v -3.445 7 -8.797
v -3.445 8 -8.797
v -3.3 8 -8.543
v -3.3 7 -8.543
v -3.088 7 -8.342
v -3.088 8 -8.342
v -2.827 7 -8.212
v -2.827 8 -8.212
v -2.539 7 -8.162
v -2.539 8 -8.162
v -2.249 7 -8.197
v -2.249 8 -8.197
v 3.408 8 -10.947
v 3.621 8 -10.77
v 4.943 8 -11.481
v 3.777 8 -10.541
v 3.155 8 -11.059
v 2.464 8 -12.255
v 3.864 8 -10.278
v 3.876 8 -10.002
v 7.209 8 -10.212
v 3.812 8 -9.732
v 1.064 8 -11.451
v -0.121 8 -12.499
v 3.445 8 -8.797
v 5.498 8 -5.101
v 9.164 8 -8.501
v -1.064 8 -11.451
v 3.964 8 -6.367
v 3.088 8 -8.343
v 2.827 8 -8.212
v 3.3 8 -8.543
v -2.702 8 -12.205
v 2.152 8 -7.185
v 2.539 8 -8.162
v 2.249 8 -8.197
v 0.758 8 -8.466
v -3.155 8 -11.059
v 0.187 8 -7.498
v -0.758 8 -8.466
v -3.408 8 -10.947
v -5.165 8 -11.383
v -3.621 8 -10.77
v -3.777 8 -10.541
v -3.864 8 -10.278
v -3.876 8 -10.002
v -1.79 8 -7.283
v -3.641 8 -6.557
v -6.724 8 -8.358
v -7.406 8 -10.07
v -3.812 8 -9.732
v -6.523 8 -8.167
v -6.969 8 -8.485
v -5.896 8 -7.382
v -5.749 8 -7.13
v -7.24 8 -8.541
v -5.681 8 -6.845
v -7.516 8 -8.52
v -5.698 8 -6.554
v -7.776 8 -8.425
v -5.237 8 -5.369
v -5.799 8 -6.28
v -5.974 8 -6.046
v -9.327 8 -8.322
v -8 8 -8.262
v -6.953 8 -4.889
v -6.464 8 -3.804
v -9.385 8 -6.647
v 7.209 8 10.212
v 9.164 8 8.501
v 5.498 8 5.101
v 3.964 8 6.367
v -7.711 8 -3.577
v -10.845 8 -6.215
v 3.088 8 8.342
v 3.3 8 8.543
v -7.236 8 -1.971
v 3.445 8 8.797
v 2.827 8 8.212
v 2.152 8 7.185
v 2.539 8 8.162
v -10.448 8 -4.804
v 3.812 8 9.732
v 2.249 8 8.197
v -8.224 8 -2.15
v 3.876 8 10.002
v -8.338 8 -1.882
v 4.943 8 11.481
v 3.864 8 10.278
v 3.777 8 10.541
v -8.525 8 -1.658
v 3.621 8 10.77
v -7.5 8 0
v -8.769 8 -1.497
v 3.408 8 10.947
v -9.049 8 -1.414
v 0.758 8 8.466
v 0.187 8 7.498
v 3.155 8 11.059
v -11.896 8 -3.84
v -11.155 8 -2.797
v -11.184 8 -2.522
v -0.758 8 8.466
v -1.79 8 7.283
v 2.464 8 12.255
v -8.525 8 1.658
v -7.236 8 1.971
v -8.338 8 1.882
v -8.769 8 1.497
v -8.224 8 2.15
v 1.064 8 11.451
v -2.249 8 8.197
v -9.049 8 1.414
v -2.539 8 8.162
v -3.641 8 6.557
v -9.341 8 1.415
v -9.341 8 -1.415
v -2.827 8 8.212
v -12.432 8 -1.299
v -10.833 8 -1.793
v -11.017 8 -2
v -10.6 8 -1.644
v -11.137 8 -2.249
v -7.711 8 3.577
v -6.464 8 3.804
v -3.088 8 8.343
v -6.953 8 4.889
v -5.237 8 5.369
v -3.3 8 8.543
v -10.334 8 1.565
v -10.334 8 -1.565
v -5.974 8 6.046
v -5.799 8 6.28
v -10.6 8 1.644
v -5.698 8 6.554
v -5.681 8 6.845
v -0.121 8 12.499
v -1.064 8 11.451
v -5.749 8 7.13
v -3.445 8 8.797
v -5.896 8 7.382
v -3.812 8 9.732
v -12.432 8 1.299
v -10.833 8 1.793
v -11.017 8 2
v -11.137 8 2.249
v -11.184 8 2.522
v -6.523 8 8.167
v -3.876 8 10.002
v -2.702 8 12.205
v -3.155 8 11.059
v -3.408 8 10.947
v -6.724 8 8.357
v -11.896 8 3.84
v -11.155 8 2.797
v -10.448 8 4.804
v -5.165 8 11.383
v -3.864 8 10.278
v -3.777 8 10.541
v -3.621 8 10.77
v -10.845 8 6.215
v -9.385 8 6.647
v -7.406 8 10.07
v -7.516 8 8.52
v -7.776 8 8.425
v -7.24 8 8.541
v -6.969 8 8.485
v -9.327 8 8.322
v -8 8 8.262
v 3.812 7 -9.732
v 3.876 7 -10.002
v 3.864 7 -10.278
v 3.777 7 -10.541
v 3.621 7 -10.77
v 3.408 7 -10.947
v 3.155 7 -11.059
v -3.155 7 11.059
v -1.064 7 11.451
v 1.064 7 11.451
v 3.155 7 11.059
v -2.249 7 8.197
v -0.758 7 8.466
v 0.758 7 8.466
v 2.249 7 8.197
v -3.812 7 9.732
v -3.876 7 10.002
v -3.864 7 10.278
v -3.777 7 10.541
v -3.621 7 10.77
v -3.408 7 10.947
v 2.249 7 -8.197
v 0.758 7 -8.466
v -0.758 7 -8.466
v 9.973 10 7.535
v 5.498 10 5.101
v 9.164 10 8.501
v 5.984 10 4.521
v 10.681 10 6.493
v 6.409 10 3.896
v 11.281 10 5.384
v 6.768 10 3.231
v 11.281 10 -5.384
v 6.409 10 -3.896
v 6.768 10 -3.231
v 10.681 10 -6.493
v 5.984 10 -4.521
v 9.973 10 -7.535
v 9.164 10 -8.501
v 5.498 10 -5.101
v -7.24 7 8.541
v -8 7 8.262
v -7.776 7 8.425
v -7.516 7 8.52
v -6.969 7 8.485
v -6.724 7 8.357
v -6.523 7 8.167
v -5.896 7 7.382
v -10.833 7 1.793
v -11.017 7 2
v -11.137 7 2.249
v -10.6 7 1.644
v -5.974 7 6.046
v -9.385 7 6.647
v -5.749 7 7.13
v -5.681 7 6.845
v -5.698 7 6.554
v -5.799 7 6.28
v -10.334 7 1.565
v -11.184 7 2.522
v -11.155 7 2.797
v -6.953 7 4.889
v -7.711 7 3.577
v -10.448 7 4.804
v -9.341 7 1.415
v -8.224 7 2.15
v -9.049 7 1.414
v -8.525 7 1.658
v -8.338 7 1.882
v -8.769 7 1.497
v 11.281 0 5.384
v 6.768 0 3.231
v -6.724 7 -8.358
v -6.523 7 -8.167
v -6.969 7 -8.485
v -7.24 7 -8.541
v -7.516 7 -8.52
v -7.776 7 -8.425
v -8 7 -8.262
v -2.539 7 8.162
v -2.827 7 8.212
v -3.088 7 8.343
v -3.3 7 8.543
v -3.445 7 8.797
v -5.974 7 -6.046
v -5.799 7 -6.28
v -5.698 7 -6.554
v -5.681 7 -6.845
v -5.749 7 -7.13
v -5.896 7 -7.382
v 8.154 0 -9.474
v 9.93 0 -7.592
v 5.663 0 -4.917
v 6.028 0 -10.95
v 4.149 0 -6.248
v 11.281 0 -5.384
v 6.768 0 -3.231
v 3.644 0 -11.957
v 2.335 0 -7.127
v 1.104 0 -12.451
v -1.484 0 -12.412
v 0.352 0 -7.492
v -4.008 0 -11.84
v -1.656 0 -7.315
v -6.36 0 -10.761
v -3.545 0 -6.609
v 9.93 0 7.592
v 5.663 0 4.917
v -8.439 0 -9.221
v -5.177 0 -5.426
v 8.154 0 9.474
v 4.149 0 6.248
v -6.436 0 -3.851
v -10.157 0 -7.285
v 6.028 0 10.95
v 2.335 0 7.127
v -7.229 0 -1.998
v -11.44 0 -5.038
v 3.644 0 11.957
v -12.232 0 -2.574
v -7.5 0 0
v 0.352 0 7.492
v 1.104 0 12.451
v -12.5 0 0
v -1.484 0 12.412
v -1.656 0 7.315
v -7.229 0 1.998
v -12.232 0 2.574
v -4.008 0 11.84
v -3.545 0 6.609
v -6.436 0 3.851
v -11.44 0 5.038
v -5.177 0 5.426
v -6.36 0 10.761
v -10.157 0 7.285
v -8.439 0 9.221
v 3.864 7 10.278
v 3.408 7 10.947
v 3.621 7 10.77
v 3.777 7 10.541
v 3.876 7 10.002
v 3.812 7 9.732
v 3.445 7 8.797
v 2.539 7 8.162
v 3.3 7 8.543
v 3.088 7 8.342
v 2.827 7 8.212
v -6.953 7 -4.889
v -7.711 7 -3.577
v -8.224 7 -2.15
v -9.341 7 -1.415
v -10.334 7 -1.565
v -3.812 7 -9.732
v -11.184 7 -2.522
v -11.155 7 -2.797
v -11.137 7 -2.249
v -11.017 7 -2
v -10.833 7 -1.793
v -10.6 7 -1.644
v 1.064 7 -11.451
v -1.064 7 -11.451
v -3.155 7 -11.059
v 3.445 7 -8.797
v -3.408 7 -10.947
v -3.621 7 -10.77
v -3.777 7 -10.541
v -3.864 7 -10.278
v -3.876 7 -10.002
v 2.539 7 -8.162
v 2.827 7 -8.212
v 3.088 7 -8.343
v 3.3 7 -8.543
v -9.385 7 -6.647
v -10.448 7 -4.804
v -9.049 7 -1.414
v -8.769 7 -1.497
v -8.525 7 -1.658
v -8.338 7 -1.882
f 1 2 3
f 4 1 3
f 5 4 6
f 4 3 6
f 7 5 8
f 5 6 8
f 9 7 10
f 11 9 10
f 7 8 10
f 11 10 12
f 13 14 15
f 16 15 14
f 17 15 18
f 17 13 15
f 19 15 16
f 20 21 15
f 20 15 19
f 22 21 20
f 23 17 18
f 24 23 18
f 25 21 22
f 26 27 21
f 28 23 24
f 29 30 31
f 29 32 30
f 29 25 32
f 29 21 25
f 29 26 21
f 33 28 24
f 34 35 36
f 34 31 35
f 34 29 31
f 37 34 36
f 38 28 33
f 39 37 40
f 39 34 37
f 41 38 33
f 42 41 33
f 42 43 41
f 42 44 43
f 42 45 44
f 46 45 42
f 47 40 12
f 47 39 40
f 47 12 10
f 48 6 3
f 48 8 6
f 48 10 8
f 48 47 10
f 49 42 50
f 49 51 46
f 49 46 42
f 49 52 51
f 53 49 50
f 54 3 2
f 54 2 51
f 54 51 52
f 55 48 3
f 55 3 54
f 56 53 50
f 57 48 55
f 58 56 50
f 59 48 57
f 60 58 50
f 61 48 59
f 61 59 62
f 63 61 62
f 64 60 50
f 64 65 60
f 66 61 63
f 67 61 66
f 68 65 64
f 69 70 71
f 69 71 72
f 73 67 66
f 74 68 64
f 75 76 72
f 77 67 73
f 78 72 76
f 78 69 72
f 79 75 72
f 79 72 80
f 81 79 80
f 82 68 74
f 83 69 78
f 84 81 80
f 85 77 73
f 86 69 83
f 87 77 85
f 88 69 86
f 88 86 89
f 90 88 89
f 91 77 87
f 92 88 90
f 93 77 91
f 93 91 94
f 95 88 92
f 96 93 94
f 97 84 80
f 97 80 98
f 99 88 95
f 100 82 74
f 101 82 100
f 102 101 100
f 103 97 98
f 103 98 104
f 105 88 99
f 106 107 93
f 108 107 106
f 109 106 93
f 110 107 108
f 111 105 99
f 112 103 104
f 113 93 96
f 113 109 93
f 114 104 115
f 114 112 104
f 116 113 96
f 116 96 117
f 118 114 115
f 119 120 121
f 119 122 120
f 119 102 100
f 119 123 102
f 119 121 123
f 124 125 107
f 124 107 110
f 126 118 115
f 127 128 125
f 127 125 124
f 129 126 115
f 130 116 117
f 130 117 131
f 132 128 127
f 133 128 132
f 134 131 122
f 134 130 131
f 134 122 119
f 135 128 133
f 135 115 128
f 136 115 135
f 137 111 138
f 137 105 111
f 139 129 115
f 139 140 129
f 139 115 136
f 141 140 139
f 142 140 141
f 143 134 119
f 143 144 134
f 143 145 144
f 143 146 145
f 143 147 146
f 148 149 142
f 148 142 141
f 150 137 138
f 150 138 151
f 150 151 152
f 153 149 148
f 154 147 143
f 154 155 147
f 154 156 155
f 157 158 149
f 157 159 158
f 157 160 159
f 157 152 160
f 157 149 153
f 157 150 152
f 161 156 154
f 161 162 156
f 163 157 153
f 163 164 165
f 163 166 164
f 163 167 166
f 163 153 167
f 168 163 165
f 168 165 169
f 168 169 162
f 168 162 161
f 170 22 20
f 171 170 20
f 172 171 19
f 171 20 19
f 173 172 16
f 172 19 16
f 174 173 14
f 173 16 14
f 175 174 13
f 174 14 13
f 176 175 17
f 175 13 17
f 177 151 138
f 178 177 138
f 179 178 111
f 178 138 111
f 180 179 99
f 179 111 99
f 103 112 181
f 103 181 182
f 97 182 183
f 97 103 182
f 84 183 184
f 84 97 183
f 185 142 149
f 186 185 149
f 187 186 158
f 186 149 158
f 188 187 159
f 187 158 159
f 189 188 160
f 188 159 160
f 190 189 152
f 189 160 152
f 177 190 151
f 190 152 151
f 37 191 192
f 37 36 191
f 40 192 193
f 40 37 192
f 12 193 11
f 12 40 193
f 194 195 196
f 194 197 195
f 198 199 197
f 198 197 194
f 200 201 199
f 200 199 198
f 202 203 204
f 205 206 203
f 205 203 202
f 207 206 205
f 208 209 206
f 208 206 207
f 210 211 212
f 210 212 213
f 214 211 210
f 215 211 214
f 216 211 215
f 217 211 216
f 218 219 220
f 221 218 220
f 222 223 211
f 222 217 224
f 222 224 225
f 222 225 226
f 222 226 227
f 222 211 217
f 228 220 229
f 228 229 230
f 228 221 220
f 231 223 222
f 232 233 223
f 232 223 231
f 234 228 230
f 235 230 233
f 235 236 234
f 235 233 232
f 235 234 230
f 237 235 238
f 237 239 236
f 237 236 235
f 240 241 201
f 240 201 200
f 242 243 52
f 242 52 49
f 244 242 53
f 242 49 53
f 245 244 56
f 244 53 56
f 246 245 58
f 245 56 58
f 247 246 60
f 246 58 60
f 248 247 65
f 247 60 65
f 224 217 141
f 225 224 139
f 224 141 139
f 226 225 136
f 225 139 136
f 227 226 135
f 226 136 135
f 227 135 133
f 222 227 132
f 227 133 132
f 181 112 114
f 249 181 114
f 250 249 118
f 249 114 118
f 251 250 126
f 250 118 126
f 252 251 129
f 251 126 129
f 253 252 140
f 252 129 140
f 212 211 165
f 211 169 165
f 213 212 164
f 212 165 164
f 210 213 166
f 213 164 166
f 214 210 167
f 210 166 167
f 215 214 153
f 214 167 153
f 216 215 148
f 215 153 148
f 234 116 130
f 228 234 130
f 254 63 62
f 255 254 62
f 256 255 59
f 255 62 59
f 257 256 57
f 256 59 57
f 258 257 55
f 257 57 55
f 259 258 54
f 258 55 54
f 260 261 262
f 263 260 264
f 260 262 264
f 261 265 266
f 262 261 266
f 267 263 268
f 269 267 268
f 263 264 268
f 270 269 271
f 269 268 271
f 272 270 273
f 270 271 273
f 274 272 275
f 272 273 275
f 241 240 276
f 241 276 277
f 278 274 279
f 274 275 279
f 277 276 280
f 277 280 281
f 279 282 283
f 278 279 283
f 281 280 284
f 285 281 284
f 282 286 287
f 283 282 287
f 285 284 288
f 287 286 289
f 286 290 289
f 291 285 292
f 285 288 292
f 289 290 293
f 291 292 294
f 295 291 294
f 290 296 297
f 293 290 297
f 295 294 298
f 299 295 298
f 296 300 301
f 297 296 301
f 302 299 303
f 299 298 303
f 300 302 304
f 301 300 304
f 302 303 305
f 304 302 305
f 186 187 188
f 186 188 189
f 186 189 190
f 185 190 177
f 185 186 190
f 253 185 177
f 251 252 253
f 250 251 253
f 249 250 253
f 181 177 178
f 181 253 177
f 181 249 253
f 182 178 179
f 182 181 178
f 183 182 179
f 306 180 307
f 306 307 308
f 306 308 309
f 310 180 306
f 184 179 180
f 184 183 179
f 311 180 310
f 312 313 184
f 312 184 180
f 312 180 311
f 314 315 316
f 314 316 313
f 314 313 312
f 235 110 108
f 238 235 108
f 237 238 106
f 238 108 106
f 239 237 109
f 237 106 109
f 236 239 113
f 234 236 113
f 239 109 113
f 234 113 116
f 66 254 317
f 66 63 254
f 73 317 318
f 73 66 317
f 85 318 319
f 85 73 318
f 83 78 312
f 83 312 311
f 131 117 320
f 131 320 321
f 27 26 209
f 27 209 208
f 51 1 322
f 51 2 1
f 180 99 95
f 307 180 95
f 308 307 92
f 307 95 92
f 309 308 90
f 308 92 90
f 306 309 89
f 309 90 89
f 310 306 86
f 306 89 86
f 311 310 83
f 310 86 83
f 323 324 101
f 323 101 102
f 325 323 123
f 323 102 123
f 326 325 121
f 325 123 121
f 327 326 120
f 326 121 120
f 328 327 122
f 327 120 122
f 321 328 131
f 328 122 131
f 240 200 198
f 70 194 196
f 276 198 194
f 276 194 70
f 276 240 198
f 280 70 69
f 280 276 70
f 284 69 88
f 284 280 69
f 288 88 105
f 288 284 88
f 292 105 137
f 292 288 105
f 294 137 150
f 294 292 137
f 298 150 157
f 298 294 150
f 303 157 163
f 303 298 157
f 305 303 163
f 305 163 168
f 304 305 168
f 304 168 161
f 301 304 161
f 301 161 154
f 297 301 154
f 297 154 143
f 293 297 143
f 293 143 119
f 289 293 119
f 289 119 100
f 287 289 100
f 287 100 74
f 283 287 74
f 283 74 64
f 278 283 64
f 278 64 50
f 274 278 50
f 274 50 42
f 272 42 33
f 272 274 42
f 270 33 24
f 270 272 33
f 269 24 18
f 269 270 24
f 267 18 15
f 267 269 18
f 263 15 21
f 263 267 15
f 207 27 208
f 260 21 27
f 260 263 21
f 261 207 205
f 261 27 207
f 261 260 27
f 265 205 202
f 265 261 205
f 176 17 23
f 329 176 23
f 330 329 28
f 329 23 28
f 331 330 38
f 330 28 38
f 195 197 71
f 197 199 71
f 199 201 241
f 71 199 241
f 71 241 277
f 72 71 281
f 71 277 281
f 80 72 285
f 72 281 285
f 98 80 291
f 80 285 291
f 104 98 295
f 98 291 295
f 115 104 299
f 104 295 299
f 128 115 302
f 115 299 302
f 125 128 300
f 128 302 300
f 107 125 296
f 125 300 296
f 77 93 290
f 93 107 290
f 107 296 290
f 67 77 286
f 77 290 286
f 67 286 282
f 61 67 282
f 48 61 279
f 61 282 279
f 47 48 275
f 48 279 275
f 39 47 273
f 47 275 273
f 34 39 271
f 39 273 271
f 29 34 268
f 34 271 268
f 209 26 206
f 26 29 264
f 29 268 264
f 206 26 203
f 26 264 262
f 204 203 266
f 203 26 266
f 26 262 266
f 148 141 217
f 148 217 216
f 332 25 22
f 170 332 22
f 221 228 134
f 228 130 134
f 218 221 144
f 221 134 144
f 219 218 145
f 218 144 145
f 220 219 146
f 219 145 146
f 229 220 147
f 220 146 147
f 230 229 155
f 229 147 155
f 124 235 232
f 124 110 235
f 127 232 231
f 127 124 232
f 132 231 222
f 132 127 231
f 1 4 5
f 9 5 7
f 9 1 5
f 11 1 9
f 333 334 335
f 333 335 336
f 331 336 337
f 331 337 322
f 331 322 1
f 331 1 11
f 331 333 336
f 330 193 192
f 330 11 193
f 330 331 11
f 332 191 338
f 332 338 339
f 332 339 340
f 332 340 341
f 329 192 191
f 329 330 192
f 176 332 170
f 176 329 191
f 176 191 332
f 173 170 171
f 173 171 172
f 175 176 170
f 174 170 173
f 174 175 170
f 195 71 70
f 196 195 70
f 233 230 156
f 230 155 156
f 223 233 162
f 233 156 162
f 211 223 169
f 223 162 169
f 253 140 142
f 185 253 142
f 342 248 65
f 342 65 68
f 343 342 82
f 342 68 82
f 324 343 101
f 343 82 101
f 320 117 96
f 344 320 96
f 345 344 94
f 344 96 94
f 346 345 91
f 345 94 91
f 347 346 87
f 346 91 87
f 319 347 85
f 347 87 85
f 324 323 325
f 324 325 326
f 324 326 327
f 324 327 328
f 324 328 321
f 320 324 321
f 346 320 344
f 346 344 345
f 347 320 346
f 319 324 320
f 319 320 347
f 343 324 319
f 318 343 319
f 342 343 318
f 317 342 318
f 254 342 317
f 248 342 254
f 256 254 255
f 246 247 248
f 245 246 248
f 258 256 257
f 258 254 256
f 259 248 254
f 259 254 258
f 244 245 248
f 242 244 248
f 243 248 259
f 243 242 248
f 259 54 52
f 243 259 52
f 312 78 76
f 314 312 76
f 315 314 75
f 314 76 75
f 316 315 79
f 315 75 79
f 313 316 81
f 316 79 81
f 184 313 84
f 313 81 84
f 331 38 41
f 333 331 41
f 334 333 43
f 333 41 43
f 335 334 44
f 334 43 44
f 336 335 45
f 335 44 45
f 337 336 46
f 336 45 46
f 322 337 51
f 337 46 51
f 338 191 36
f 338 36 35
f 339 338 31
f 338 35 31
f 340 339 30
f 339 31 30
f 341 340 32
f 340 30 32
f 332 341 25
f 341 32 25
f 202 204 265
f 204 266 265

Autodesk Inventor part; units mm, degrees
ref_plane "YZ Plane" through (0, 0, 0) normal (1, 0, 0) x (0, 1, 0)
ref_plane "XZ Plane" through (0, 0, 0) normal (0, 1, 0) x (-1, 0, 0)
ref_plane "XY Plane" through (0, 0, 0) normal (0, 0, 1) x (1, 0, 0)
sketch "Эскиз1" plane through (0, 0, 0) normal (0, 1, 0) x (-1, 0, 0)
  arc A0 (-11.2808, -5.3845) -> (-11.2808, 5.3845) centre (0, 0) ccw
  arc A1 (-6.7685, -3.2307) -> (-6.7685, 3.2307) centre (0, 0) ccw
  line L0 (-6.7685, -3.2307) -> (-11.2808, -5.3845)
  line L1 (-6.7685, 3.2307) -> (-11.2808, 5.3845)
  dimension "d0" = 25
  dimension "d1" = 15
extrude "Выдавливание1" add sketch "Эскиз1" along normal blind 8
sketch "Эскиз2" plane through (0, 8, 0) normal (0, 1, 0) x (1, 0, 0)
  line L0 (5.4983, 5.1008) -> (9.1638, 8.5014)
  arc A0 (11.2808, 5.3845) -> (11.2808, -5.3845) centre (0, 0) ccw projected
  arc A1 (11.2808, 5.3845) -> (11.2808, -5.3845) centre (0, 0) ccw projected
  line L1 (11.2808, -5.3845) -> (6.7685, -3.2307) projected
  arc A2 (6.7685, 3.2307) -> (6.7685, -3.2307) centre (0, 0) ccw projected
  line L2 (6.7685, 3.2307) -> (11.2808, 5.3845) projected
  arc A3 (6.7685, 3.2307) -> (6.7685, -3.2307) centre (0, 0) ccw projected
  line L3 (5.4983, -5.1008) -> (9.1638, -8.5014)
  point P0 (11.2808, -5.3845)
extrude "Выдавливание2" add sketch "Эскиз2" along normal blind 2 contours L0 A0 L2 A2 | A2 L1 A0 L3
sketch "Эскиз3" plane through (0, 8, 0) normal (0, 1, 0) x (1, 0, 0)
  arc A0 (2.2493, 8.197) -> (-2.2493, 8.197) centre (0, 0) ccw
  arc A1 (3.1548, 11.0588) -> (-3.1548, 11.0588) centre (0, 0) ccw
  line L0 (3.4451, 8.7967) -> (3.8116, 9.7325)
  arc A2 (9.1638, 8.5014) -> (9.1638, -8.5014) centre (0, 0) ccw projected
  arc A3 (5.4983, 5.1008) -> (5.4983, -5.1008) centre (0, 0) ccw projected
  line L1 (-3.4451, 8.7967) -> (-3.8116, 9.7325)
  arc A4 (3.8116, 9.7325) -> (3.1548, 11.0588) centre (2.8804, 10.0972) ccw
  arc A5 (2.2493, 8.197) -> (3.4451, 8.7967) centre (2.5139, 9.1613) ccw
  arc A6 (-3.1548, 11.0588) -> (-3.8116, 9.7325) centre (-2.8804, 10.0972) ccw
  arc A7 (-3.4451, 8.7967) -> (-2.2493, 8.197) centre (-2.5139, 9.1613) ccw
  arc A8 (-5.9741, 6.0464) -> (-5.8956, 7.3819) centre (-6.677, 6.7578) ccw
  line L2 (-5.8956, 7.3819) -> (-6.5228, 8.1672)
  arc A9 (-5.9741, 6.0464) -> (-8.2235, 2.1505) centre (0, 0) ccw
  arc A10 (-9.3407, 1.4148) -> (-8.2235, 2.1505) centre (-9.1909, 2.4035) ccw
  arc A11 (-6.5228, 8.1672) -> (-7.9998, 8.2615) centre (-7.3042, 7.5431) ccw
  line L3 (-9.3407, 1.4148) -> (-10.3344, 1.5653)
  arc A12 (-11.1546, 2.7973) -> (-10.3344, 1.5653) centre (-10.1846, 2.5541) ccw
  arc A13 (-7.9998, 8.2615) -> (-11.1546, 2.7973) centre (0, 0) ccw
  arc A14 (-8.2235, -2.1505) -> (-9.3407, -1.4148) centre (-9.1909, -2.4035) ccw
  line L4 (-9.3407, -1.4148) -> (-10.3344, -1.5653)
  arc A15 (-8.2235, -2.1505) -> (-5.9741, -6.0464) centre (0, 0) ccw
  arc A16 (-5.8956, -7.3819) -> (-5.9741, -6.0464) centre (-6.677, -6.7578) ccw
  arc A17 (-10.3344, -1.5653) -> (-11.1546, -2.7973) centre (-10.1846, -2.5541) ccw
  line L5 (-5.8956, -7.3819) -> (-6.5228, -8.1672)
  arc A18 (-7.9998, -8.2615) -> (-6.5228, -8.1672) centre (-7.3042, -7.5431) ccw
  arc A19 (-11.1546, -2.7973) -> (-7.9998, -8.2615) centre (0, 0) ccw
  arc A20 (-2.2493, -8.197) -> (-3.4451, -8.7967) centre (-2.5139, -9.1613) ccw
  line L6 (-3.4451, -8.7967) -> (-3.8116, -9.7325)
  arc A21 (-2.2493, -8.197) -> (2.2493, -8.197) centre (0, 0) ccw
  arc A22 (3.4451, -8.7967) -> (2.2493, -8.197) centre (2.5139, -9.1613) ccw
  arc A23 (-3.8116, -9.7325) -> (-3.1548, -11.0588) centre (-2.8804, -10.0972) ccw
  line L7 (3.4451, -8.7967) -> (3.8116, -9.7325)
  arc A24 (3.1548, -11.0588) -> (3.8116, -9.7325) centre (2.8804, -10.0972) ccw
  arc A25 (-3.1548, -11.0588) -> (3.1548, -11.0588) centre (0, 0) ccw
  point P0 (4.1936, 10.7081)
  point P1 (3.0996, 7.9147)
  point P2 (-4.1936, 10.7081)
  point P3 (-3.0996, 7.9147)
  point P4 (-5.3045, 6.6417)
  point P5 (-8.4041, 1.273)
  point P6 (-7.1767, 8.9859)
  point P7 (-11.3703, 1.7222)
  point P8 (-8.4041, -1.273)
  point P9 (-5.3045, -6.6417)
  point P10 (-11.3703, -1.7222)
  point P11 (-7.1767, -8.9859)
  point P12 (-3.0996, -7.9147)
  point P13 (3.0996, -7.9147)
  point P14 (-4.1936, -10.7081)
  point P15 (4.1936, -10.7081)
  dimension "d8" = 3
  dimension "d9" = 1
  dimension "d12" = 180
extrude "Выдавливание3" cut sketch "Эскиз3" against normal blind 1
properties part number "pawn"
